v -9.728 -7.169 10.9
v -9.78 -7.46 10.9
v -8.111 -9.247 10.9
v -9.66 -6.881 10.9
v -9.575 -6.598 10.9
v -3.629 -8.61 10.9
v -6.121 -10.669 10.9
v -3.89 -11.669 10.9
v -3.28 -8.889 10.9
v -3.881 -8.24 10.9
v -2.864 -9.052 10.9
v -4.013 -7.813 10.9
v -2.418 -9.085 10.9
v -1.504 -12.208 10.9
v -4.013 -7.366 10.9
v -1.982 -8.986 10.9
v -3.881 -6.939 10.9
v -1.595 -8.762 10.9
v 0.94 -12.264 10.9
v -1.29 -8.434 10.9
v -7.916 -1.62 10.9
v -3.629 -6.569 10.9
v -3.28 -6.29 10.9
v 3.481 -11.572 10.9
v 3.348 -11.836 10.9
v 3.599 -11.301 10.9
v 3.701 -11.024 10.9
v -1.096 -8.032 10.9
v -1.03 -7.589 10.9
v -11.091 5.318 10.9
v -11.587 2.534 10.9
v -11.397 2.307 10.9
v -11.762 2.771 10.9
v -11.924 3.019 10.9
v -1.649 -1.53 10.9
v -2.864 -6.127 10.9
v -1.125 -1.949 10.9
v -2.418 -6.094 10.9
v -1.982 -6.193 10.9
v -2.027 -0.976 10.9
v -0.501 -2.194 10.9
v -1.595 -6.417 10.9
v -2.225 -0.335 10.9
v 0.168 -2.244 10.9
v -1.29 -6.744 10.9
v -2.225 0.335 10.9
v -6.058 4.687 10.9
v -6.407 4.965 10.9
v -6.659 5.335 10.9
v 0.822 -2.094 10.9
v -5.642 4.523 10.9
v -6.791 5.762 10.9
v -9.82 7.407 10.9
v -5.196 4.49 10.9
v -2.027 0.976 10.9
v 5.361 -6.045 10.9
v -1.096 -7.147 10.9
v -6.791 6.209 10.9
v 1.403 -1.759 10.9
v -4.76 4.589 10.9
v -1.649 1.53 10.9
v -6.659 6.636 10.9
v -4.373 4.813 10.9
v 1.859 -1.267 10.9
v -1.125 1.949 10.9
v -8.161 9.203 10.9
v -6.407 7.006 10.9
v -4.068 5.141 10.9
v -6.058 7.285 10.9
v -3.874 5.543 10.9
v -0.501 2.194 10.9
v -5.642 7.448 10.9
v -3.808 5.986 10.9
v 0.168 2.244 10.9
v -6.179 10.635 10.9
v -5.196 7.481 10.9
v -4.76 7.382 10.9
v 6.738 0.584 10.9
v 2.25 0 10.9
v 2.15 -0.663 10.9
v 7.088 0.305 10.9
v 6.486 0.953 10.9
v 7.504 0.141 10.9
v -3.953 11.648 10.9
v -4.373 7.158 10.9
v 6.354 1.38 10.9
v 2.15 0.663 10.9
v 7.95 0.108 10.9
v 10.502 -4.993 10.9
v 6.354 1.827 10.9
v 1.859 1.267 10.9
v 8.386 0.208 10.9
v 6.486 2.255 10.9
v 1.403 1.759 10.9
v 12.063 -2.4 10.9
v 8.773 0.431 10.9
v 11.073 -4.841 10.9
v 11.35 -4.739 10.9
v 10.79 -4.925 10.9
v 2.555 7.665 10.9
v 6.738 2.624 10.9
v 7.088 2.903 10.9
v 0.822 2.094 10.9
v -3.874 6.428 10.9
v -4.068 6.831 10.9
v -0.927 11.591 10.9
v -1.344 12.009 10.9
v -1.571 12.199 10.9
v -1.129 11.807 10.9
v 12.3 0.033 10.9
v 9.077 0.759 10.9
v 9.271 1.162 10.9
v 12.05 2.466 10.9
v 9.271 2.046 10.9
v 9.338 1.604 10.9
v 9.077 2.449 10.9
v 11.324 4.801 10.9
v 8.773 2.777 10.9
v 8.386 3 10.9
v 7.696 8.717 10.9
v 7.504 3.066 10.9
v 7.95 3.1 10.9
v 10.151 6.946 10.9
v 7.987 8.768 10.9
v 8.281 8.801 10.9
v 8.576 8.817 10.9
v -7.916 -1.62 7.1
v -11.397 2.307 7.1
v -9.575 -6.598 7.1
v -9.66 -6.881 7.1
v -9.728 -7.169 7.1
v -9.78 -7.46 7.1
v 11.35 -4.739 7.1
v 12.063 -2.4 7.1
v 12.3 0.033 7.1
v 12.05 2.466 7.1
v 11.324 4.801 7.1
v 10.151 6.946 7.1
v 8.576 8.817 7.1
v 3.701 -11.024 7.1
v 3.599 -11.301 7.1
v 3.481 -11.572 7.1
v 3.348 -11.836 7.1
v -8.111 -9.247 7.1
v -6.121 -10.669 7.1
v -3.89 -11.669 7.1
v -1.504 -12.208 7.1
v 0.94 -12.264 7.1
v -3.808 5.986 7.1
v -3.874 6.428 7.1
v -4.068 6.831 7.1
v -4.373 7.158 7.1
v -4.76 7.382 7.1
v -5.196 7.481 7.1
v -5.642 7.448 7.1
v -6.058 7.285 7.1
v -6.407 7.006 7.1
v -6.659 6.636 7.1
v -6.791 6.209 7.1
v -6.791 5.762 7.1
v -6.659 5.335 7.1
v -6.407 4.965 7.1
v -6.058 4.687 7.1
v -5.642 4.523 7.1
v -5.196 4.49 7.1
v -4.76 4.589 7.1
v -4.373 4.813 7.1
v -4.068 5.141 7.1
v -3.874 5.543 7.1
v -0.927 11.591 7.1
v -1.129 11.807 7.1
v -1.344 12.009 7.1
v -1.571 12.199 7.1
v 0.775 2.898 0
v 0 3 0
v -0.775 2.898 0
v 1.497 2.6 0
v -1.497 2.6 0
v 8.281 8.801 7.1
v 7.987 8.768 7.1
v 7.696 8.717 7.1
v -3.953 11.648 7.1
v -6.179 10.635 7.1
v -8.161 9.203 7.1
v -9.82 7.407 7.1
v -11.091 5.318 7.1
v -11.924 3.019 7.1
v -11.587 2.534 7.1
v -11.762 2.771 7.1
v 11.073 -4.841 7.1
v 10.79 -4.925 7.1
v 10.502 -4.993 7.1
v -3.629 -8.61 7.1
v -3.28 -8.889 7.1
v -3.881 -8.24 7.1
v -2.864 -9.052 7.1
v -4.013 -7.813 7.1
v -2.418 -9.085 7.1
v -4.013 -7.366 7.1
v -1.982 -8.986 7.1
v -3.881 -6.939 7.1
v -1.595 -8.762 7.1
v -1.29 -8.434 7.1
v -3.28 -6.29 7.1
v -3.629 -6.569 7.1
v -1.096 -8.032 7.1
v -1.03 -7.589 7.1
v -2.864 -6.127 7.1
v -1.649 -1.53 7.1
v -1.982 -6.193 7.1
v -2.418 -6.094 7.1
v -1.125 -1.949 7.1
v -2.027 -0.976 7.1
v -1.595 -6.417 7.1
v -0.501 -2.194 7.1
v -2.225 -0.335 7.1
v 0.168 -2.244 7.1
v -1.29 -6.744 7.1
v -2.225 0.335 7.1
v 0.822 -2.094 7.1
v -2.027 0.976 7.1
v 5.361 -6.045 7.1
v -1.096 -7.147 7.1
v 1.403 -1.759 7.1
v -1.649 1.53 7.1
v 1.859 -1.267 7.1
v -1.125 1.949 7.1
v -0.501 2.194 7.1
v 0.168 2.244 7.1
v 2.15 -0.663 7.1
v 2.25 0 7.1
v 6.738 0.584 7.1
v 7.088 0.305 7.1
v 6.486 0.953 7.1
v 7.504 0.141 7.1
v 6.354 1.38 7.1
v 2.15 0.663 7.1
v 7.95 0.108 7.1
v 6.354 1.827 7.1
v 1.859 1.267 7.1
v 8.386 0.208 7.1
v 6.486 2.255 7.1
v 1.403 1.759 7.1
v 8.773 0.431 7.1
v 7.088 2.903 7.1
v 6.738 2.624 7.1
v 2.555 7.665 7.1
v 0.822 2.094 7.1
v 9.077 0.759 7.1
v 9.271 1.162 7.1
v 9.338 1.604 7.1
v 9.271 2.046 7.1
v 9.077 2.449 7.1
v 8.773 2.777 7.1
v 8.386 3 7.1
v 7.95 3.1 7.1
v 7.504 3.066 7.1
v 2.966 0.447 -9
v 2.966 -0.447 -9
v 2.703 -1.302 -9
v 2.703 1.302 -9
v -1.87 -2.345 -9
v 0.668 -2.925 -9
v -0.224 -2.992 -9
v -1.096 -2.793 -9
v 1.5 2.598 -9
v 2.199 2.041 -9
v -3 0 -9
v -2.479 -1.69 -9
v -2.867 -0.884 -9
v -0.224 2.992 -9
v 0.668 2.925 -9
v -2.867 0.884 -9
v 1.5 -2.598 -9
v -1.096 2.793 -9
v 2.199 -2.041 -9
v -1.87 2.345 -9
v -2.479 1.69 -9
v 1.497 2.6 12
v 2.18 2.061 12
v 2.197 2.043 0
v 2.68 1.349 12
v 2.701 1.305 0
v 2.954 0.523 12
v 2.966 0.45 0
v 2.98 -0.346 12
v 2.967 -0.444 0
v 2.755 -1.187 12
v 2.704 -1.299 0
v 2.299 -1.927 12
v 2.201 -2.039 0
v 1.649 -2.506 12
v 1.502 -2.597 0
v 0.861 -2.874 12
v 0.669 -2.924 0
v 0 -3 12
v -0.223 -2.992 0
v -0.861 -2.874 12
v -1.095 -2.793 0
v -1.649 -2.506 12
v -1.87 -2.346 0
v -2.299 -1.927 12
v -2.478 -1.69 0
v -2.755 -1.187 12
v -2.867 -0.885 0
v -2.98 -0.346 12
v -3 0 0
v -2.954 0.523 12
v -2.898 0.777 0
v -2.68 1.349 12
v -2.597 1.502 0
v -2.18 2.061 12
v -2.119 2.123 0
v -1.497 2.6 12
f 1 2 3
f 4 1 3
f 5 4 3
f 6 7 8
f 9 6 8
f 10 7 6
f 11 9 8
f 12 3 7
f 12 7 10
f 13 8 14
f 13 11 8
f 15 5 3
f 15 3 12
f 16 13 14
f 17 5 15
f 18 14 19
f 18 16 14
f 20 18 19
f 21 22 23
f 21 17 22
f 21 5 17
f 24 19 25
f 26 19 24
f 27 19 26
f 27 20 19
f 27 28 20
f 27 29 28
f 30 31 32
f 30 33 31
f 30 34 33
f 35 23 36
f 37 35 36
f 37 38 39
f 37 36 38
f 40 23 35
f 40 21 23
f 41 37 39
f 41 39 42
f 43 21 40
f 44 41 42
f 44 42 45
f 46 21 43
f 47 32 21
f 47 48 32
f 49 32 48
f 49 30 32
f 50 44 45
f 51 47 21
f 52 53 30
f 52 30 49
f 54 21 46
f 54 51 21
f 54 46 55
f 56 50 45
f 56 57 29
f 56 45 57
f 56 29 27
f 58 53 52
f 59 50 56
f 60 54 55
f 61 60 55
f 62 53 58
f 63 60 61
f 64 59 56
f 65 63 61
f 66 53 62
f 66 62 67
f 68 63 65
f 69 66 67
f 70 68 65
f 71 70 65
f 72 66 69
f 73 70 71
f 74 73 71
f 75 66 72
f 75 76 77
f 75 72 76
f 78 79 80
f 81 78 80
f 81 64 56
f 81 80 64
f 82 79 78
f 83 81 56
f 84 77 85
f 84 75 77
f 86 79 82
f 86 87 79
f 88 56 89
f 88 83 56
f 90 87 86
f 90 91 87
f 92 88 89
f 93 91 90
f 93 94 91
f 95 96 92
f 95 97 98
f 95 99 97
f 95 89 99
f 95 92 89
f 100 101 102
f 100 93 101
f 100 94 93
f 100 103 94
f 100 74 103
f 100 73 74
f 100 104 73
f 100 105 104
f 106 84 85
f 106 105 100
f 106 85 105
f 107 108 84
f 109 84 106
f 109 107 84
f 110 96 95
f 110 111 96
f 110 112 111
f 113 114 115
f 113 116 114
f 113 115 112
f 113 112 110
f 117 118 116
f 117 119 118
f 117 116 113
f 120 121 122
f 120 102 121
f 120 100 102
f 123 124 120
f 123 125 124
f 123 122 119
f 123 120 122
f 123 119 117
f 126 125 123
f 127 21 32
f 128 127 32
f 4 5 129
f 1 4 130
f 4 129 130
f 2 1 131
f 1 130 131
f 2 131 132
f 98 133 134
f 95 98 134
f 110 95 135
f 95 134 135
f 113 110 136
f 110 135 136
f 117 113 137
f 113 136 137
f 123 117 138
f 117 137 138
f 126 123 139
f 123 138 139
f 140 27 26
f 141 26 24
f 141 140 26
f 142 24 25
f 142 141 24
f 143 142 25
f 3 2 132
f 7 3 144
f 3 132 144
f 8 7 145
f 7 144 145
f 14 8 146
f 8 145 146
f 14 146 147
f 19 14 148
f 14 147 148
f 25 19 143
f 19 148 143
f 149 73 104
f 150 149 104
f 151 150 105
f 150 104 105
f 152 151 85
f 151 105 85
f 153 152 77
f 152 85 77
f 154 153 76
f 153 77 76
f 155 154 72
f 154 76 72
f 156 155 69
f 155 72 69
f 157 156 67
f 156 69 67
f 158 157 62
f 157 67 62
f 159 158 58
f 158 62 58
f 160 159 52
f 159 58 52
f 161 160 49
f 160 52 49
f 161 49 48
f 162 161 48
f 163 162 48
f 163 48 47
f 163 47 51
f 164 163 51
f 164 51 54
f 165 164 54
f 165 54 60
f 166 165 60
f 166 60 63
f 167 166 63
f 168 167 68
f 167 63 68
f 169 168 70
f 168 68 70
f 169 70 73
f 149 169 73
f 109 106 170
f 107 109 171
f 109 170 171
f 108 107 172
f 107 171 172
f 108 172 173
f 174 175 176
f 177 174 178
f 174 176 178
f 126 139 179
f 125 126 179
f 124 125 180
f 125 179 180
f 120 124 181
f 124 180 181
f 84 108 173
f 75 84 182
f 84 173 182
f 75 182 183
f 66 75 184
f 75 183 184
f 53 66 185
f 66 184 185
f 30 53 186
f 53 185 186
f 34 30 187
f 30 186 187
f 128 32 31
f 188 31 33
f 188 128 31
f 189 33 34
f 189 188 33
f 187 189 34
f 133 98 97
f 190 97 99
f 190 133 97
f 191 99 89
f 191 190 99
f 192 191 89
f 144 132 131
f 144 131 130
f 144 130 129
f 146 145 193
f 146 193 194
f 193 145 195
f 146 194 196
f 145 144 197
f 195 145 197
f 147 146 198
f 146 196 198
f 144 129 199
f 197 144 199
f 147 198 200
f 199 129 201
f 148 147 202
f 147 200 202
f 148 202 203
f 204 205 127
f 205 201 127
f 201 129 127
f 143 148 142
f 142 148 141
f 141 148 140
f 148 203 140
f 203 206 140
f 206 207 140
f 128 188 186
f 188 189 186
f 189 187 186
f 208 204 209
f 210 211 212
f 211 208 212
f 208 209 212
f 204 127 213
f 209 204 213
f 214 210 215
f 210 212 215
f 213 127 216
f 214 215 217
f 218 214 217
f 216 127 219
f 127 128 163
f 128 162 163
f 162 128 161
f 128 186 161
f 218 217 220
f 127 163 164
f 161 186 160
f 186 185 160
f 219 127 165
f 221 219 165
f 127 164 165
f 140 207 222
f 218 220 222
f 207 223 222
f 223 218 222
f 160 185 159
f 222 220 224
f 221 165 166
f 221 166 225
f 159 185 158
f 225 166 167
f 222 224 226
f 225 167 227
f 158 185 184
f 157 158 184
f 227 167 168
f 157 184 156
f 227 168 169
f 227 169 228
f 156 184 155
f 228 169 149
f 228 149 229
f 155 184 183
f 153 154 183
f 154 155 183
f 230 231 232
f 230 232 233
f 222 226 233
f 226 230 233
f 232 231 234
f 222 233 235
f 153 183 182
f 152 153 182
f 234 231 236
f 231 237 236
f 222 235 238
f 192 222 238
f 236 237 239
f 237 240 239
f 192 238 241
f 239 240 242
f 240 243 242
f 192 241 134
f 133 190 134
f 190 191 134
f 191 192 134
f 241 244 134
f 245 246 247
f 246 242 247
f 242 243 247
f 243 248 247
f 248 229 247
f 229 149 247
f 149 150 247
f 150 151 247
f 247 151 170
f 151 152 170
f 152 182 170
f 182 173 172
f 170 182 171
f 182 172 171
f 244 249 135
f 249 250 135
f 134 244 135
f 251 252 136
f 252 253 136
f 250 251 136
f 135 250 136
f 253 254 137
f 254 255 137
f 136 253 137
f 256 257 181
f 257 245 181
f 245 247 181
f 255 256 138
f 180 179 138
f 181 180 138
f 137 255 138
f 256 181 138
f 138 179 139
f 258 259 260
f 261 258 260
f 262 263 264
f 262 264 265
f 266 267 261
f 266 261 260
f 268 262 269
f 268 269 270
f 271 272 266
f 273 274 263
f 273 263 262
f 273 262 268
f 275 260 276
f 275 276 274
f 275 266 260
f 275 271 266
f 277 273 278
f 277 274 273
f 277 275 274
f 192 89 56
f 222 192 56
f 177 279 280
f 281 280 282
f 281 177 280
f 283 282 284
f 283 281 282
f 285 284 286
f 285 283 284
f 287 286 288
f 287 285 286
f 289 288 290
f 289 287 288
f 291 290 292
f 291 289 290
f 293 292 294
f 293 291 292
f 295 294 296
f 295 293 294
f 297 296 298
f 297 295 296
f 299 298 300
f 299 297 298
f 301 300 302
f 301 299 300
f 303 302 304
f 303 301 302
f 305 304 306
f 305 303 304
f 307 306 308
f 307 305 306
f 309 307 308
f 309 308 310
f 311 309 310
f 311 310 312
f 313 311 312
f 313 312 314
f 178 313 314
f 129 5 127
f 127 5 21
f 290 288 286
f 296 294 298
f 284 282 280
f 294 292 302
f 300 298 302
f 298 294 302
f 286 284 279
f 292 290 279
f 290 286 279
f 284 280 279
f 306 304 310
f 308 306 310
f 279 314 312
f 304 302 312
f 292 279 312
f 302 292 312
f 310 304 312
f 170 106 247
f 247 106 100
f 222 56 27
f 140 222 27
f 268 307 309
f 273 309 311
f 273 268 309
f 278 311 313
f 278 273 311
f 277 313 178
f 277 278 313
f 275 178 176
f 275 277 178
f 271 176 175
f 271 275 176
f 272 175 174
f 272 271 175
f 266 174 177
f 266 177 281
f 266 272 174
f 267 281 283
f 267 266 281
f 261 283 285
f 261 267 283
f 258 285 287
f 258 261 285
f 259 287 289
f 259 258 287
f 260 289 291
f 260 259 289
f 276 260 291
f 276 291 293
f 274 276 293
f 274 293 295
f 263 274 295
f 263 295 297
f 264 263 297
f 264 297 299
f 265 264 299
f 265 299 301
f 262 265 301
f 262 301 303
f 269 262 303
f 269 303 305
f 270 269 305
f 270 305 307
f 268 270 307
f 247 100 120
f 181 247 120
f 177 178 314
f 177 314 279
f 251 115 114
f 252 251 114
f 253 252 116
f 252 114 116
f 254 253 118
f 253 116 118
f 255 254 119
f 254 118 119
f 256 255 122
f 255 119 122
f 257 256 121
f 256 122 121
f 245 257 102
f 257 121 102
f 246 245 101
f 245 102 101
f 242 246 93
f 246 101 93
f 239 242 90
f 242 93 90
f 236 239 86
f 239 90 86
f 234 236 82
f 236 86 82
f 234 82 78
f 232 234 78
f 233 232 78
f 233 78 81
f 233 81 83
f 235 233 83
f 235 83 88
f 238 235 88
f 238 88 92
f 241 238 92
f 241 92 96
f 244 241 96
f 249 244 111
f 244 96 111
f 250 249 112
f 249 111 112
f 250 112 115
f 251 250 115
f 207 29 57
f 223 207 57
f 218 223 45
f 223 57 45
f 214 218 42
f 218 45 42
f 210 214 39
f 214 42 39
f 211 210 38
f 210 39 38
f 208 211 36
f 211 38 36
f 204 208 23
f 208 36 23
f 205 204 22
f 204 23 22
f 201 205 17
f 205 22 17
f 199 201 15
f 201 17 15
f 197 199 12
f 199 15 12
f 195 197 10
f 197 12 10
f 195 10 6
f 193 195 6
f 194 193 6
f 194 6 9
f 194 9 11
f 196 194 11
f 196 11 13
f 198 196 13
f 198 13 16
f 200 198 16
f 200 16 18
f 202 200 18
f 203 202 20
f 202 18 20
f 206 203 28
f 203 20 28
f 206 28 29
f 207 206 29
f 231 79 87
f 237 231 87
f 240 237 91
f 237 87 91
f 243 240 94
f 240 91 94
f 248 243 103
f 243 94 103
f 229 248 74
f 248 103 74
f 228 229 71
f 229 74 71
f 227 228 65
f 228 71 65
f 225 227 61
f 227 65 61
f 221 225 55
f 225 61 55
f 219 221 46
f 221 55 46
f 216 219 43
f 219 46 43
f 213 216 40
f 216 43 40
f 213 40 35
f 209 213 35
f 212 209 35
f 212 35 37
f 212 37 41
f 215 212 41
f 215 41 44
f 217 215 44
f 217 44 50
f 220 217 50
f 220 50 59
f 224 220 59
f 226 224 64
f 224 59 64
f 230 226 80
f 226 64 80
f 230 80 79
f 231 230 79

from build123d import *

# Parameters (mm, degrees)
SALIENTE_EXTRUIR1_DEPTH    = 12
SALIENTE_EXTRUIR2_START    = 9
CROQUIS2_R                 = 3
SALIENTE_EXTRUIR2_DEPTH    = 9
CROQUIS3_R                 = 5.7
SALIENTE_EXTRUIR3_DEPTH    = 8
CROQUIS4_R                 = 8.2
CROQUIS4_R_2               = 3.2
SALIENTE_EXTRUIR4_DEPTH    = 5
CORTAR_EXTRUIR1_DEPTH      = 18.420677369
CORTAR_EXTRUIR1_DEPTH_BACK = 18.420677369
CROQUIS5_R                 = 8.2
CROQUIS5_R_2               = 4.75
CROQUIS6_R                 = 14.5
CROQUIS6_R_2               = 4.75
SALIENTE_EXTRUIR5_DEPTH    = 13
CROQUIS7_R                 = 2.4
CORTAR_EXTRUIR2_DEPTH      = 25.279621084
CROQUIS8_R                 = 2.4
SALIENTE_EXTRUIR6_DEPTH    = 3.8
CROQUIS9_R                 = 14.5
CORTAR_EXTRUIR3_DEPTH      = 2.5
CROQUIS10_R                = 14.5
CORTAR_EXTRUIR4_DEPTH      = 5.6
CORTAR_EXTRUIR5_DEPTH      = 8.7
REDONDEO2_R                = 5
CORTAR_EXTRUIR6_DEPTH      = 4.9
CROQUIS14_R                = 2.4
CROQUIS14_R_2              = 1.5
CROQUIS14_R_3              = 3.2
CROQUIS14_R_4              = 2.25
SALIENTE_EXTRUIR7_DEPTH    = 3.8
CORTAR_EXTRUIR7_DEPTH      = 29.545572317
CORTAR_EXTRUIR7_DEPTH_BACK = 3.8
CROQUIS15_R                = 16.228984294
CROQUIS15_R_2              = 12.3


with BuildPart() as part:
    # Croquis1 → Saliente-Extruir1 (new body)
    with BuildSketch(Plane.XY):
        with BuildLine():
            Line((-1.496662955, 2.6), (1.496662955, 2.6))
            ThreePointArc((1.496662955, 2.6), (0, -3), (-1.496662955, 2.6))
        make_face()
    extrude(amount=SALIENTE_EXTRUIR1_DEPTH)

    # Croquis2 → Saliente-Extruir2 (add)
    with BuildSketch(Plane(origin=(0, 0, 0), x_dir=(-1, 0, 0), z_dir=(0, 0, -1)).offset(SALIENTE_EXTRUIR2_START)):
        Circle(CROQUIS2_R)
    extrude(amount=-SALIENTE_EXTRUIR2_DEPTH)


with BuildPart() as body_2:
    # Croquis3 → Saliente-Extruir3 (new body)
    with BuildSketch(Plane.XY.offset(12)):
        Circle(CROQUIS3_R)
        with BuildLine():
            Line((-1.549193338, 2.8), (1.549193338, 2.8))
            ThreePointArc((1.549193338, 2.8), (0, -3.2), (-1.549193338, 2.8))
        make_face(mode=Mode.SUBTRACT)
    extrude(amount=-SALIENTE_EXTRUIR3_DEPTH)

    # Croquis4 → Saliente-Extruir4 (add)
    with BuildSketch(Plane(origin=(0, 0, 4), x_dir=(-1, 0, 0), z_dir=(0, 0, -1))):
        Circle(CROQUIS4_R)
        with Locations(Location((0, 0, 0), (0, 0, 118.955024372))):
            Circle(CROQUIS4_R_2, mode=Mode.SUBTRACT)
    extrude(amount=SALIENTE_EXTRUIR4_DEPTH)

    # Croquis5 → Cortar-Extruir1 (cut, two sides: drawn at the far end of the back side and taken through both)
    with BuildSketch(Plane.XY.offset(4).offset(-CORTAR_EXTRUIR1_DEPTH_BACK)):
        Circle(CROQUIS5_R)
        Circle(CROQUIS5_R_2, mode=Mode.SUBTRACT)
    extrude(amount=CORTAR_EXTRUIR1_DEPTH + CORTAR_EXTRUIR1_DEPTH_BACK, mode=Mode.SUBTRACT)

    # Croquis6 → Saliente-Extruir5 (add, through all)
    with BuildSketch(Plane(origin=(0, 0, -1), x_dir=(-1, 0, 0), z_dir=(0, 0, -1))):
        Circle(CROQUIS6_R)
        Circle(CROQUIS6_R_2, mode=Mode.SUBTRACT)
    extrude(amount=-SALIENTE_EXTRUIR5_DEPTH)

    # Croquis7 → Cortar-Extruir2 (cut, through all)
    with BuildSketch(Plane(origin=(0, 0, -1), x_dir=(-1, 0, 0), z_dir=(0, 0, -1))):
        with Locations((-7.837581754, 1.603842962)):
            Circle(CROQUIS7_R)
        with Locations((5.307759626, 5.985623422)):
            Circle(CROQUIS7_R)
        with Locations((2.529822128, -7.589466384)):
            Circle(CROQUIS7_R)
    extrude(amount=-CORTAR_EXTRUIR2_DEPTH, mode=Mode.SUBTRACT)

    # Croquis8 → Saliente-Extruir6 (add)
    with BuildSketch(Plane.XY.offset(12)):
        with BuildLine():
            ThreePointArc((14.5, 0), (-3.752866127, 14.005927168), (-12.557378736, -7.24998202))
            ThreePointArc((-12.557378736, -7.24998202), (3.752866127, -14.005927168), (14.5, 0))
        make_face()
        with Locations(Location((-2.529822128, -7.589466384, 0), (0, 0, 180))):
            Circle(CROQUIS8_R, mode=Mode.SUBTRACT)
        with BuildLine():
            ThreePointArc((1.549193338, 2.8), (0, -3.2), (-1.549193338, 2.8))
            Line((-1.549193338, 2.8), (1.549193338, 2.8))
        make_face(mode=Mode.SUBTRACT)
        with Locations(Location((-5.307759626, 5.985623422, 0), (0, 0, 180))):
            Circle(CROQUIS8_R, mode=Mode.SUBTRACT)
        with Locations(Location((7.837581754, 1.603842962, 0), (0, 0, 180))):
            Circle(CROQUIS8_R, mode=Mode.SUBTRACT)
    extrude(amount=SALIENTE_EXTRUIR6_DEPTH)

    # Croquis9 → Cortar-Extruir3 (cut)
    with BuildSketch(Plane(origin=(0, 0, -1), x_dir=(-1, 0, 0), z_dir=(0, 0, -1))):
        Circle(CROQUIS9_R)
    extrude(amount=-CORTAR_EXTRUIR3_DEPTH, mode=Mode.SUBTRACT)

    # Croquis10 → Cortar-Extruir4 (cut)
    with BuildSketch(Plane(origin=(0, 0, 1.5), x_dir=(-1, 0, 0), z_dir=(0, 0, -1))):
        Circle(CROQUIS10_R)
    extrude(amount=-CORTAR_EXTRUIR4_DEPTH, mode=Mode.SUBTRACT)

    # Croquis12 → Cortar-Extruir5 (cut)
    with BuildSketch(Plane.XY.offset(15.8)):
        with BuildLine():
            ThreePointArc((-13.661331745, 4.859836927), (-14.205616929, -2.906965369), (-10.654126191, -9.835628862))
            Line((-10.654126191, -9.835628862), (-7.915513403, -1.619790499))
            Line((-7.915513403, -1.619790499), (-13.661331745, 4.859836927))
        make_face()
        with BuildLine():
            ThreePointArc((11.039408109, 9.401141877), (4.585302607, 13.755907822), (-3.190841361, 14.144558367))
            Line((-3.190841361, 14.144558367), (2.55497698, 7.664930941))
            Line((2.55497698, 7.664930941), (11.039408109, 9.401141877))
        make_face()
        with BuildLine():
            Line((5.360536423, -6.045140441), (2.621923635, -14.260978804))
            ThreePointArc((2.621923635, -14.260978804), (9.620314322, -10.848942453), (13.844967552, -4.308929505))
            Line((13.844967552, -4.308929505), (5.360536423, -6.045140441))
        make_face()
    extrude(amount=-CORTAR_EXTRUIR5_DEPTH, mode=Mode.SUBTRACT)

    # Redondeo2
    redondeo2_edges = [body_2.edges().sort_by_distance(p)[0] for p in [
        (-10.654126191, -9.835628862, 11.45),
        (-13.661331745, 4.859836927, 11.45),
        (-3.190841361, 14.144558367, 11.45),
        (11.039408109, 9.401141877, 11.45),
        (13.844967552, -4.308929505, 11.45),
        (2.621923635, -14.260978804, 11.45),
    ]]
    fillet(redondeo2_edges, radius=REDONDEO2_R)

    # Croquis13 → Cortar-Extruir6 (cut)
    with BuildSketch(Plane.XY.offset(15.8)):
        with BuildLine():
            Line((-12.145566924, 1.643263718), (-9.046770887, -1.851285291))
            Line((-9.046770887, -1.851285291), (-10.523741085, -6.282195885))
            ThreePointArc((-10.523741085, -6.282195885), (-10.451769026, -10.280553749), (-7.883204221, -13.345601943))
            ThreePointArc((-7.883204221, -13.345601943), (-4.901530373, -14.70459112), (-1.700797789, -15.406404087))
            ThreePointArc((-1.700797789, -15.406404087), (2.193082971, -14.495504415), (4.649675337, -11.340001359))
            Line((4.649675337, -11.340001359), (6.126645535, -6.909090765))
            Line((6.126645535, -6.909090765), (10.70241177, -5.97272918))
            ThreePointArc((10.70241177, -5.97272918), (14.129105224, -3.911220617), (15.499232422, -0.154254147))
            ThreePointArc((15.499232422, -0.154254147), (15.185314649, 3.107445739), (14.192736214, 6.230267952))
            ThreePointArc((14.192736214, 6.230267952), (11.456933578, 9.147017773), (7.495891587, 9.696737641))
            Line((7.495891587, 9.696737641), (2.920125352, 8.760376056))
            Line((2.920125352, 8.760376056), (-0.178670685, 12.254925065))
            ThreePointArc((-0.178670685, 12.254925065), (-3.677336199, 14.191774365), (-7.6160282, 13.49985609))
            ThreePointArc((-7.6160282, 13.49985609), (-10.283784275, 11.597145381), (-12.491938426, 9.176136135))
            ThreePointArc((-12.491938426, 9.176136135), (-13.650016549, 5.348486641), (-12.145566924, 1.643263718))
        make_face()
    extrude(amount=-CORTAR_EXTRUIR6_DEPTH, mode=Mode.SUBTRACT)

    # Croquis14 → Saliente-Extruir7 (add)
    # profile 1 of 4: a face of its own
    with BuildSketch(Plane.XY.offset(10.9)):
        with Locations((-2.529822128, -7.589466384)):
            Circle(CROQUIS14_R)
        with Locations((-2.529822128, -7.589466384)):
            Circle(CROQUIS14_R_2, mode=Mode.SUBTRACT)
    # profile 2 of 4: a face of its own
    with BuildSketch(Plane.XY.offset(10.9)):
        with Locations((7.837581754, 1.603842962)):
            Circle(CROQUIS14_R)
        with Locations((7.837581754, 1.603842962)):
            Circle(CROQUIS14_R_2, mode=Mode.SUBTRACT)
    # profile 3 of 4: a face of its own
    with BuildSketch(Plane.XY.offset(10.9)):
        Circle(CROQUIS14_R_3)
        Circle(CROQUIS14_R_4, mode=Mode.SUBTRACT)
    # profile 4 of 4: a face of its own
    with BuildSketch(Plane.XY.offset(10.9)):
        with Locations((-5.307759626, 5.985623422)):
            Circle(CROQUIS14_R)
        with Locations((-5.307759626, 5.985623422)):
            Circle(CROQUIS14_R_2, mode=Mode.SUBTRACT)
    extrude(amount=-SALIENTE_EXTRUIR7_DEPTH)

    # Croquis15 → Cortar-Extruir7 (cut, two sides: drawn at the far end of the back side and taken through both)
    with BuildSketch(Plane.XY.offset(10.9).offset(-CORTAR_EXTRUIR7_DEPTH_BACK)):
        Circle(CROQUIS15_R)
        Circle(CROQUIS15_R_2, mode=Mode.SUBTRACT)
    extrude(amount=CORTAR_EXTRUIR7_DEPTH + CORTAR_EXTRUIR7_DEPTH_BACK, mode=Mode.SUBTRACT)


solid = Compound([part.part, body_2.part])
